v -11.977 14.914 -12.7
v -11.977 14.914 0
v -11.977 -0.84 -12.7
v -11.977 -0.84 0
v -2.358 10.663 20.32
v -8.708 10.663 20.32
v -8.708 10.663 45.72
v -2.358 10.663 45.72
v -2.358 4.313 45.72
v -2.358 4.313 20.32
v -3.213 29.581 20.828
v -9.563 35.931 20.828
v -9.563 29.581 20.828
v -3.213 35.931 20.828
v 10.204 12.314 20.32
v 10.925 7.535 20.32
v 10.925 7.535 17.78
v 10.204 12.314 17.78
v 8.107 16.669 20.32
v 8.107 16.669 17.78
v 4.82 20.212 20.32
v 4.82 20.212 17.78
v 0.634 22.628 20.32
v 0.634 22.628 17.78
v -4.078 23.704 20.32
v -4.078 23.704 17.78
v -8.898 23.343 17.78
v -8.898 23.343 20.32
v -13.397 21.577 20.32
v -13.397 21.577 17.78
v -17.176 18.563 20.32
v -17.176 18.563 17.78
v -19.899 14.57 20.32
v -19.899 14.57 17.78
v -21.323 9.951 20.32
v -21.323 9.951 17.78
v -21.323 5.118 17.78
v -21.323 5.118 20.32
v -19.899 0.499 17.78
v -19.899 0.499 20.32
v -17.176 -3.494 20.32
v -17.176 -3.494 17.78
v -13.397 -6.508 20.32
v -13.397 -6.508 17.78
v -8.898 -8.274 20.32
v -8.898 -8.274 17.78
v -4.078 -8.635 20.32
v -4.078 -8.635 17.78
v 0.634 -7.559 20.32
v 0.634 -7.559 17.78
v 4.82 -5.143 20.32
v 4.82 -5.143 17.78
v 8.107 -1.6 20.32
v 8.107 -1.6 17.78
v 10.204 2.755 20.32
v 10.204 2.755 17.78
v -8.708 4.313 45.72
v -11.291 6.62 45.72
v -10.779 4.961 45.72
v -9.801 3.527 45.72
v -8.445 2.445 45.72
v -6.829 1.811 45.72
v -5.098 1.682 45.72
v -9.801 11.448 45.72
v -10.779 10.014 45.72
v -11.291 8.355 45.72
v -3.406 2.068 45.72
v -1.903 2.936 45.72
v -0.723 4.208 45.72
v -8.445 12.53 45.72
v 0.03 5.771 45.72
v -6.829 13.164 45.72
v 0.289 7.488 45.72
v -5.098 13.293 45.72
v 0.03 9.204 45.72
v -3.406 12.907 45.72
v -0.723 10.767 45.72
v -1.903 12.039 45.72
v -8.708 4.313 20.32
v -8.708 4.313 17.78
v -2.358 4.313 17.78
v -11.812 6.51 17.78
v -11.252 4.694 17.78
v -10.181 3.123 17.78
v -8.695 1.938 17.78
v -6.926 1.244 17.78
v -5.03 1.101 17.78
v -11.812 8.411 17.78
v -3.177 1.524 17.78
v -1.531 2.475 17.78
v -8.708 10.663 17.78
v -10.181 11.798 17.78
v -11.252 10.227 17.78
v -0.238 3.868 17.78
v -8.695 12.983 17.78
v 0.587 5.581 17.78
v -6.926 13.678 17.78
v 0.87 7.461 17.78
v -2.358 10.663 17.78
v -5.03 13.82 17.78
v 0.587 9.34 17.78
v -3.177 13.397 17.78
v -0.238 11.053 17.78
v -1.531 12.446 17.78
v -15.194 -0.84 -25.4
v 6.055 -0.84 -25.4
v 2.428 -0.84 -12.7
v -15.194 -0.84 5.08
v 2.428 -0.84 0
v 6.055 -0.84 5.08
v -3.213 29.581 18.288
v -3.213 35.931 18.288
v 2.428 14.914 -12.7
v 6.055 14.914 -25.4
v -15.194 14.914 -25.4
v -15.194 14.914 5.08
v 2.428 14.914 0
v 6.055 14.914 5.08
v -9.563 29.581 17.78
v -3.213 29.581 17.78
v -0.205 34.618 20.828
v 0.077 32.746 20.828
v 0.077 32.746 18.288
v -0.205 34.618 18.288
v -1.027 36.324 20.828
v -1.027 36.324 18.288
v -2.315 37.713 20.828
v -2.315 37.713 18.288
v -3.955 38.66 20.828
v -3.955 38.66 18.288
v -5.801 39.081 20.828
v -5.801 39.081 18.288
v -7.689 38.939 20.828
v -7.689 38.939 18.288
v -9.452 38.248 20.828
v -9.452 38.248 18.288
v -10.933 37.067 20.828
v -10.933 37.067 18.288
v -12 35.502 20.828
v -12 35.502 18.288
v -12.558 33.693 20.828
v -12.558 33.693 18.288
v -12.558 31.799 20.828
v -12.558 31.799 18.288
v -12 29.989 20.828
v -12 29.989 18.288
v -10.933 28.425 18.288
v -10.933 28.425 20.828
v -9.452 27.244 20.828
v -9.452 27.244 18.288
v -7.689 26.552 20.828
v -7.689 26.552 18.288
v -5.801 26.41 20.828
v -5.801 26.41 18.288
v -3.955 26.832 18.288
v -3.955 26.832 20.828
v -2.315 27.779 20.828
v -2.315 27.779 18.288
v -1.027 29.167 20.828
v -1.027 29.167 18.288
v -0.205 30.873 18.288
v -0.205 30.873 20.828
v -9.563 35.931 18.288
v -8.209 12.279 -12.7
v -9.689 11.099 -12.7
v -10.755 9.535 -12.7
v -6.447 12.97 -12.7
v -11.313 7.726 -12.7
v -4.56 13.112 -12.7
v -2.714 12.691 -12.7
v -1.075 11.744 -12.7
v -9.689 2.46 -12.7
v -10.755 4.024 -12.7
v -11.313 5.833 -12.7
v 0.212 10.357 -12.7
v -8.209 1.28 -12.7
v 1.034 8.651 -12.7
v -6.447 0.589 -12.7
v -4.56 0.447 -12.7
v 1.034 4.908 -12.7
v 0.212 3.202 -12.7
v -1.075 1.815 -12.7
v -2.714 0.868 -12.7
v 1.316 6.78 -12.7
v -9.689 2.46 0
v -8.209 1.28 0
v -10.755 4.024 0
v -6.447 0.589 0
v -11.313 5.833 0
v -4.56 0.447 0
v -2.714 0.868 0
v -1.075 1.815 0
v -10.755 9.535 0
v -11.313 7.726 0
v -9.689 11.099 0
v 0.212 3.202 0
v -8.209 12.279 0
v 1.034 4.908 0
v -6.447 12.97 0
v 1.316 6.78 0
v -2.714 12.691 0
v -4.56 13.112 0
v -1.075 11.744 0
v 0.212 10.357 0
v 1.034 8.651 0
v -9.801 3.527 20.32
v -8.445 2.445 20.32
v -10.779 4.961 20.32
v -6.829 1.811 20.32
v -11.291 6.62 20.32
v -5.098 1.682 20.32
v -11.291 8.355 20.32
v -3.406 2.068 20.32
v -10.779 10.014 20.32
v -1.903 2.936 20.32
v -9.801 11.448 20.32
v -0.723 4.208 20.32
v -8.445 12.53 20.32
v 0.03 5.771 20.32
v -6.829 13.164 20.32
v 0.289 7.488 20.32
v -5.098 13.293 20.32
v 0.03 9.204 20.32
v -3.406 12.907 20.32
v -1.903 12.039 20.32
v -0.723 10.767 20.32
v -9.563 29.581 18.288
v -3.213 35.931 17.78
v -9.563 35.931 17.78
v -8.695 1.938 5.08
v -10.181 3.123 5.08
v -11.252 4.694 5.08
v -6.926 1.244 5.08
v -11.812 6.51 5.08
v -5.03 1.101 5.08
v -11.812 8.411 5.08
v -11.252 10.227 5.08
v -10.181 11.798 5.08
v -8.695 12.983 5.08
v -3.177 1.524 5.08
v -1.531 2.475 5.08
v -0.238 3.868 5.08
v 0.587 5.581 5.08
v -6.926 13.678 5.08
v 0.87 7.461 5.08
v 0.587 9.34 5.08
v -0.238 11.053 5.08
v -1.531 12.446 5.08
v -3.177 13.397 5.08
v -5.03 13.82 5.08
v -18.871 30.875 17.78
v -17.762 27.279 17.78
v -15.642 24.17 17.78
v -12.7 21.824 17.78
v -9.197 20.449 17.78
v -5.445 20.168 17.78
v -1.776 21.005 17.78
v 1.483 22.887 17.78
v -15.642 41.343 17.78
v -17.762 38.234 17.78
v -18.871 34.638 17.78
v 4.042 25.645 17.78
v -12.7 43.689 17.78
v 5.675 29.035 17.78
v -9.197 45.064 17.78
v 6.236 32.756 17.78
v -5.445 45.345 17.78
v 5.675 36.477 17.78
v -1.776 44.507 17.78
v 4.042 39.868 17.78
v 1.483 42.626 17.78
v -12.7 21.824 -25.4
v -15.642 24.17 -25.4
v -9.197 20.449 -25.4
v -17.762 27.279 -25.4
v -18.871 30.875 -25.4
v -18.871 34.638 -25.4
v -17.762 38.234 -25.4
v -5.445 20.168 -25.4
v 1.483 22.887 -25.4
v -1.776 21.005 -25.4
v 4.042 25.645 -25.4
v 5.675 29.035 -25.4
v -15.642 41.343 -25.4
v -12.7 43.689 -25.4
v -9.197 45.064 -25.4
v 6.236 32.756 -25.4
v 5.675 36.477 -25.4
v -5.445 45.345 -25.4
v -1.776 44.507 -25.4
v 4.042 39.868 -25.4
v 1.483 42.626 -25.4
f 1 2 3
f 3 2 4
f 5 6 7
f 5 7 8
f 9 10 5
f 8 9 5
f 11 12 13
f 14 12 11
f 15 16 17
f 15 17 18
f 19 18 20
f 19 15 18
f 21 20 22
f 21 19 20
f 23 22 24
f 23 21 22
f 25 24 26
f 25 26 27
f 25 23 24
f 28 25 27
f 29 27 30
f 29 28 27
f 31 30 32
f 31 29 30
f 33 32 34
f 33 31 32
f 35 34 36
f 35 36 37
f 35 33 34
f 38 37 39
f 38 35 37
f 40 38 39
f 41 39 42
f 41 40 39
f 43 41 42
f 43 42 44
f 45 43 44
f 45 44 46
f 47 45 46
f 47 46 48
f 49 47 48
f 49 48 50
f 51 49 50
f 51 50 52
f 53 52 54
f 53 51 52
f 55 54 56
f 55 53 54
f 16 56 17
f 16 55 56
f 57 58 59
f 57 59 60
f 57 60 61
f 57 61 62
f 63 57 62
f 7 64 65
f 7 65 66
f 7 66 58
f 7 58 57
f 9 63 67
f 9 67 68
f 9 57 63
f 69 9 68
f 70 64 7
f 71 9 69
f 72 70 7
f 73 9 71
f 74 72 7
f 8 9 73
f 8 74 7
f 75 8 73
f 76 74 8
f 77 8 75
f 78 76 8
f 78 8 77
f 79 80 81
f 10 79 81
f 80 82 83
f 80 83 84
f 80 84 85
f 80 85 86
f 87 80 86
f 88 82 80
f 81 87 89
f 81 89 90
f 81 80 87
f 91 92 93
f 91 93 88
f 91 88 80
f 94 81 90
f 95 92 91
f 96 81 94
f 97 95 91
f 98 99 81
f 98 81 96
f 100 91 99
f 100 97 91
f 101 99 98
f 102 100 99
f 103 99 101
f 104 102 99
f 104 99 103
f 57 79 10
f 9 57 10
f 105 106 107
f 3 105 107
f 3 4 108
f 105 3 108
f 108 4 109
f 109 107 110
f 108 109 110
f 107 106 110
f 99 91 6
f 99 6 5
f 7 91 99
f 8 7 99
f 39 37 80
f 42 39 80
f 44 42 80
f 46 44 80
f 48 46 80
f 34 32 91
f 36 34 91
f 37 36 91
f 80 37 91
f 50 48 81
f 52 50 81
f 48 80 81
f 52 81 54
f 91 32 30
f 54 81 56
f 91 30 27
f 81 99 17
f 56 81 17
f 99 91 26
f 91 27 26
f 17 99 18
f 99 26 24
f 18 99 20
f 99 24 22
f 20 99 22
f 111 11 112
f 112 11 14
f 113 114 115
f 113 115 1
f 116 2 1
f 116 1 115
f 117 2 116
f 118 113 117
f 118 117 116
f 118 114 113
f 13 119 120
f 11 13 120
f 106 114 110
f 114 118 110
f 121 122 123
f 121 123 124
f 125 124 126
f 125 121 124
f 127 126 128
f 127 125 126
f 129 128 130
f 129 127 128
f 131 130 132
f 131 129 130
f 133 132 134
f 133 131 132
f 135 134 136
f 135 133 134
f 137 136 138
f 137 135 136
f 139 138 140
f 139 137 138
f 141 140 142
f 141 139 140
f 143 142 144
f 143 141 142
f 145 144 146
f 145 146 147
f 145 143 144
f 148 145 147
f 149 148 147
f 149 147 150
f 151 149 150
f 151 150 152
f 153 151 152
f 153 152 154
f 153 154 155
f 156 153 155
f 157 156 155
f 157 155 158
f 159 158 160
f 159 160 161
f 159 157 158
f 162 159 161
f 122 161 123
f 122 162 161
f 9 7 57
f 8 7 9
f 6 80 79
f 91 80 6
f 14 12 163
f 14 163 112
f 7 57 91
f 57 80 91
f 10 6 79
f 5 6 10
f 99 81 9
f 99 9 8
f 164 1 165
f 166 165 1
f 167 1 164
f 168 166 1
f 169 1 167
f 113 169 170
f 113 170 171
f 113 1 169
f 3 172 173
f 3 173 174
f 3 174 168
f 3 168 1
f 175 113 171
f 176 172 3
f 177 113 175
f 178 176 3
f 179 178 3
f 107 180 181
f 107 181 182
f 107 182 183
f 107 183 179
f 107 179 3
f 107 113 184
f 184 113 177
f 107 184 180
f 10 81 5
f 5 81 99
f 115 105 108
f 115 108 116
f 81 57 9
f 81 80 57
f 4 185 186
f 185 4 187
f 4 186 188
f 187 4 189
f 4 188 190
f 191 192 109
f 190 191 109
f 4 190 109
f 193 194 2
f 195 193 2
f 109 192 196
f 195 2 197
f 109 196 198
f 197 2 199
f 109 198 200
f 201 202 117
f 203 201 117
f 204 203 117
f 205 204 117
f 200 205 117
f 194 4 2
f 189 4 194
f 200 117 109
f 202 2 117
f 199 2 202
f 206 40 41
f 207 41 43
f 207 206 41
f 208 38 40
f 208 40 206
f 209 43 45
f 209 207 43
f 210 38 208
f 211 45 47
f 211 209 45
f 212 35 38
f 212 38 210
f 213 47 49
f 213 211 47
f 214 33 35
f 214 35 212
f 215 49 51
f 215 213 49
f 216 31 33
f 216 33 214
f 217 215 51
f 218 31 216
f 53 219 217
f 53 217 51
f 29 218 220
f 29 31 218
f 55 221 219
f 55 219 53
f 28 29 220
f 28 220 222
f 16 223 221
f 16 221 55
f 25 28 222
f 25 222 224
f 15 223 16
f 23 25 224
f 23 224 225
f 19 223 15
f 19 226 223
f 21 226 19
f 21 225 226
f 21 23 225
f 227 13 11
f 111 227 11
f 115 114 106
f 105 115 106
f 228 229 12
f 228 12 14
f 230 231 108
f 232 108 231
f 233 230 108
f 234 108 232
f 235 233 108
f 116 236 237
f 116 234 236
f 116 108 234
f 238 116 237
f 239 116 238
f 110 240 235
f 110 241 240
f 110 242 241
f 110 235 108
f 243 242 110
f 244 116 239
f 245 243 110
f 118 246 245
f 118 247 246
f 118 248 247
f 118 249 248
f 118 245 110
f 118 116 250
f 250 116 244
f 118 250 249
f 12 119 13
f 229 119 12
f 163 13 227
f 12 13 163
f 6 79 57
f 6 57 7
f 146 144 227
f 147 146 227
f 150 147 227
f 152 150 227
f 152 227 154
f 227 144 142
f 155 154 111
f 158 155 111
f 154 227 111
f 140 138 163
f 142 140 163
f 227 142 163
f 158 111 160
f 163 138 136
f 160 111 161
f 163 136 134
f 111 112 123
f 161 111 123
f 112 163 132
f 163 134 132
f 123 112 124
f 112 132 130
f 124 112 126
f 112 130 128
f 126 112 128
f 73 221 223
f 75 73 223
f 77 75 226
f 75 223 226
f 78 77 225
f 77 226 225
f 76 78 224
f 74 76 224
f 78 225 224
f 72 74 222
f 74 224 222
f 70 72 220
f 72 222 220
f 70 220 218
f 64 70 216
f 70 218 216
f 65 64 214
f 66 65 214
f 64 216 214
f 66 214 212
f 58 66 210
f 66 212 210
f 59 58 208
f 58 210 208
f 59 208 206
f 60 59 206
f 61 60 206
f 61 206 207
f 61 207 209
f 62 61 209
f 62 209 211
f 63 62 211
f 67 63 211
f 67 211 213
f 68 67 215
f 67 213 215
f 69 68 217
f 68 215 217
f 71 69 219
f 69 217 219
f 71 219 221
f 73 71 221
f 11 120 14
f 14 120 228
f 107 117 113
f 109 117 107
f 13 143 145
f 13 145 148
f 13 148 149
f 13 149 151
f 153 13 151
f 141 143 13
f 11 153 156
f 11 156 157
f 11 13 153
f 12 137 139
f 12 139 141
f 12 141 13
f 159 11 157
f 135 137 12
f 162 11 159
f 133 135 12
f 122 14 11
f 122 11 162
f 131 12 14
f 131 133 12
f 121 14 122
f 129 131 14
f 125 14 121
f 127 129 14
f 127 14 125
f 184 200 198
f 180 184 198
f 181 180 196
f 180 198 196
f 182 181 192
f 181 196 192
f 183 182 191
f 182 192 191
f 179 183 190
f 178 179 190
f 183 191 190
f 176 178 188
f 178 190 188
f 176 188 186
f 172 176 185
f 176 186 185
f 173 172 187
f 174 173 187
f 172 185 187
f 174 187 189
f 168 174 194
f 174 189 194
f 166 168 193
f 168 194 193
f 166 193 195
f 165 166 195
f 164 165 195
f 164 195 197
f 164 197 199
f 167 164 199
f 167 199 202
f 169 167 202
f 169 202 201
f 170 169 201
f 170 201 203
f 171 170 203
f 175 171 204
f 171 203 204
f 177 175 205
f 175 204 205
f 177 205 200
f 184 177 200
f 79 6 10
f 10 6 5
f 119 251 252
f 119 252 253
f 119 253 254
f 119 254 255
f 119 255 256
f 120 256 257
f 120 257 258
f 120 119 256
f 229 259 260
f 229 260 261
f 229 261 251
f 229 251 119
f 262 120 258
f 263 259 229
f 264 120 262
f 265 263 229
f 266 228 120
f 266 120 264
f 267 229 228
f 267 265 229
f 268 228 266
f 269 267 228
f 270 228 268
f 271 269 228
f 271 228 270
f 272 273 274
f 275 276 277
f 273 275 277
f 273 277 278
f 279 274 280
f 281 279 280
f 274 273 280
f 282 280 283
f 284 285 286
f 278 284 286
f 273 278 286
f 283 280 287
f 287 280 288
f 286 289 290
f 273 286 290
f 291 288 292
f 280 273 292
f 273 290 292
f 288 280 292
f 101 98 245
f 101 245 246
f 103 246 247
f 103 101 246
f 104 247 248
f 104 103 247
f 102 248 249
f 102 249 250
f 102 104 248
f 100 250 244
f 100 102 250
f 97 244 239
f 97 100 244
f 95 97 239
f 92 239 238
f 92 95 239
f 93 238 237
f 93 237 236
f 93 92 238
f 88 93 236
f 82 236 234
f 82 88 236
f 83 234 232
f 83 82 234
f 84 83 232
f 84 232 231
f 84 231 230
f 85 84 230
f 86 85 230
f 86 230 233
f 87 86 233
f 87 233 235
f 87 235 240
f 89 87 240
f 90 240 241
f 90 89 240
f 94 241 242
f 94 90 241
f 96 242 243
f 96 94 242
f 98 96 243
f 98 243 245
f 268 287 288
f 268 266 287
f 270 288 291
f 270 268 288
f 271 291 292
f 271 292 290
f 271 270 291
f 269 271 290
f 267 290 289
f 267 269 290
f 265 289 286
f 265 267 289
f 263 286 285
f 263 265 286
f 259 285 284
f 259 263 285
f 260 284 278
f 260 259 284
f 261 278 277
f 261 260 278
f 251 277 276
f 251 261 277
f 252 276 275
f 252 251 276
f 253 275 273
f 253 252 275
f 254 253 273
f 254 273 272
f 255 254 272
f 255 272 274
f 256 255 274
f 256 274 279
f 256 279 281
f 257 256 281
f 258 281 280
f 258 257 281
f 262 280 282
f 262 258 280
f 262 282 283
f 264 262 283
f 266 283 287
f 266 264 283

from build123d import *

# Parameters (mm, degrees)
F0_R      = 12.6238
F1_DEPTH  = 17.78
F0_R_2    = 4.2291
F2_R      = 6.376929238
F2_R_2    = 4.2291
F3_DEPTH  = 12.7
F4_W      = 21.2488458492
F4_H      = 15.7541136723
F5_DEPTH  = 5.08
F6_W      = 6.35
F6_H      = 6.35
F7_DEPTH  = 2.54
F8_W      = 6.35
F8_H      = 6.35
F9_DEPTH  = 3.048
F10_R     = 16.2146713523
F10_W     = 6.35
F10_H     = 6.35
F11_DEPTH = 2.54
F12_R     = 6.3530257629
F12_W     = 6.35
F12_H     = 6.35
F13_DEPTH = 2.54
F14_R     = 5.8220855013
F14_W     = 6.35
F14_H     = 6.35
F15_DEPTH = 25.4
F16_DEPTH = 25.4
F17_DEPTH = 19.05
F18_R     = 6.35
F19_DEPTH = 12.7
F20_W     = 3.6265931558
F20_H     = 15.7541136723
F20_W_2   = 3.216993995
F21_DEPTH = 25.4
F22_DEPTH = 6.35
F23_W     = 15.7541136723
F23_H     = 12.7
F24_DEPTH = 15.24


with BuildPart() as f1:
    # F0 (on Top) → F1 (new body)
    with BuildSketch(Plane.XY):
        with Locations((-6.3880984679, 32.7563181388)):
            Circle(F0_R)
    extrude(amount=F1_DEPTH)

    # F8 (on face) → F9 (join)
    with BuildSketch(Plane.XY.offset(17.78)):
        with Locations((-6.3880984679, 32.7563181388)):
            Rectangle(F8_W, F8_H)
    extrude(amount=F9_DEPTH)

    # F17 (add): a face of the model
    f17_faces = [f1.faces().sort_by_distance(p)[0] for p in [
        (-6.3880984679, 32.7563181388, 0),
    ]]
    extrude(f17_faces, amount=F17_DEPTH)

    # F22 (add): a face of the model
    f22_faces = [f1.faces().sort_by_distance(p)[0] for p in [
        (-6.3880984679, 32.7563181388, -19.05),
    ]]
    extrude(f22_faces, amount=F22_DEPTH)


with BuildPart() as f1b:
    # F0 (on Top) → F1, piece 2 (new body)
    with BuildSketch(Plane.XY):
        with Locations((-5.5065363796, 7.4605747914)):
            Circle(F0_R_2)
    extrude(amount=F1_DEPTH)

    # F2 (on face) → F3 (join)
    with BuildSketch(Plane.XY.offset(17.78)):
        with Locations((-5.5065363796, 7.4605747914)):
            Circle(F2_R)
        with Locations((-5.5065363796, 7.4605747914)):
            Circle(F2_R_2, mode=Mode.SUBTRACT)
    extrude(amount=-F3_DEPTH)

    # F4 (on Top) → F5 (join)
    with BuildSketch(Plane.XY):
        with Locations((-4.5697938185, 7.0365635911)):
            Rectangle(F4_W, F4_H)
    extrude(amount=F5_DEPTH)

    # F6 (on face) → F7 (join)
    with BuildSketch(Plane.XY.offset(17.78)):
        with Locations((-5.5334656176, 7.4875040295)):
            Rectangle(F6_W, F6_H)
    extrude(amount=F7_DEPTH)


with BuildPart() as f11:
    # F10 (on face) → F11 (new body)
    with BuildSketch(Plane.XY.offset(20.32)):
        with Locations((-5.289810244, 7.5345193036)):
            Circle(F10_R)
        with Locations((-5.5334656176, 7.4875040295)):
            Rectangle(F10_W, F10_H, mode=Mode.SUBTRACT)
    extrude(amount=-F11_DEPTH)

    # F14 (on face) → F15 (join)
    with BuildSketch(Plane.XY.offset(20.32)):
        with Locations((-5.5334656176, 7.4875040295)):
            Circle(F14_R)
        with Locations((-5.5334656176, 7.4875040295)):
            Rectangle(F14_W, F14_H, mode=Mode.SUBTRACT)
    extrude(amount=F15_DEPTH)


with BuildPart() as f13:
    # F12 (on face) → F13 (new body)
    with BuildSketch(Plane.XY.offset(20.828)):
        with Locations((-6.275807973, 32.7456742525)):
            Circle(F12_R)
        with Locations((-6.3880984679, 32.7563181388)):
            Rectangle(F12_W, F12_H, mode=Mode.SUBTRACT)
    extrude(amount=-F13_DEPTH)


with BuildPart() as f16:
    # F16 (new): a face of the model
    f16_faces = [f1b.part.faces().sort_by_distance(p)[0] for p in [
        (-5.5334656176, 7.4875040295, 20.32),
    ]]
    extrude(f16_faces, amount=F16_DEPTH)


with BuildPart() as f1b_1:
    add(f1b.part)

    # F18 (on face) → F19 (join)
    with BuildSketch(Plane(origin=(0, 0, 0), x_dir=(1, 0, 0), z_dir=(0, 0, -1))):
        with Locations((-5.0342167431, -6.7795067549)):
            Circle(F18_R)
    extrude(amount=F19_DEPTH)

    # F20 (on face) → F21 (join)
    with BuildSketch(Plane(origin=(0, 0, 0), x_dir=(1, 0, 0), z_dir=(0, 0, -1))):
        with Locations((4.2413325282, -7.0365635911)):
            Rectangle(F20_W, F20_H)
        with Locations((-13.5857197456, -7.0365635911)):
            Rectangle(F20_W_2, F20_H)
    extrude(amount=F21_DEPTH)

    # F23 (on face) → F24 (join)
    with BuildSketch(Plane(origin=(2.4280359503, 0, 0), x_dir=(0, -1, 0), z_dir=(-1, 0, 0))):
        with Locations((-7.0365635911, -19.05)):
            Rectangle(F23_W, F23_H)
    extrude(amount=F24_DEPTH)


solid = Compound([f1.part, f11.part, f13.part, f16.part, f1b_1.part])
